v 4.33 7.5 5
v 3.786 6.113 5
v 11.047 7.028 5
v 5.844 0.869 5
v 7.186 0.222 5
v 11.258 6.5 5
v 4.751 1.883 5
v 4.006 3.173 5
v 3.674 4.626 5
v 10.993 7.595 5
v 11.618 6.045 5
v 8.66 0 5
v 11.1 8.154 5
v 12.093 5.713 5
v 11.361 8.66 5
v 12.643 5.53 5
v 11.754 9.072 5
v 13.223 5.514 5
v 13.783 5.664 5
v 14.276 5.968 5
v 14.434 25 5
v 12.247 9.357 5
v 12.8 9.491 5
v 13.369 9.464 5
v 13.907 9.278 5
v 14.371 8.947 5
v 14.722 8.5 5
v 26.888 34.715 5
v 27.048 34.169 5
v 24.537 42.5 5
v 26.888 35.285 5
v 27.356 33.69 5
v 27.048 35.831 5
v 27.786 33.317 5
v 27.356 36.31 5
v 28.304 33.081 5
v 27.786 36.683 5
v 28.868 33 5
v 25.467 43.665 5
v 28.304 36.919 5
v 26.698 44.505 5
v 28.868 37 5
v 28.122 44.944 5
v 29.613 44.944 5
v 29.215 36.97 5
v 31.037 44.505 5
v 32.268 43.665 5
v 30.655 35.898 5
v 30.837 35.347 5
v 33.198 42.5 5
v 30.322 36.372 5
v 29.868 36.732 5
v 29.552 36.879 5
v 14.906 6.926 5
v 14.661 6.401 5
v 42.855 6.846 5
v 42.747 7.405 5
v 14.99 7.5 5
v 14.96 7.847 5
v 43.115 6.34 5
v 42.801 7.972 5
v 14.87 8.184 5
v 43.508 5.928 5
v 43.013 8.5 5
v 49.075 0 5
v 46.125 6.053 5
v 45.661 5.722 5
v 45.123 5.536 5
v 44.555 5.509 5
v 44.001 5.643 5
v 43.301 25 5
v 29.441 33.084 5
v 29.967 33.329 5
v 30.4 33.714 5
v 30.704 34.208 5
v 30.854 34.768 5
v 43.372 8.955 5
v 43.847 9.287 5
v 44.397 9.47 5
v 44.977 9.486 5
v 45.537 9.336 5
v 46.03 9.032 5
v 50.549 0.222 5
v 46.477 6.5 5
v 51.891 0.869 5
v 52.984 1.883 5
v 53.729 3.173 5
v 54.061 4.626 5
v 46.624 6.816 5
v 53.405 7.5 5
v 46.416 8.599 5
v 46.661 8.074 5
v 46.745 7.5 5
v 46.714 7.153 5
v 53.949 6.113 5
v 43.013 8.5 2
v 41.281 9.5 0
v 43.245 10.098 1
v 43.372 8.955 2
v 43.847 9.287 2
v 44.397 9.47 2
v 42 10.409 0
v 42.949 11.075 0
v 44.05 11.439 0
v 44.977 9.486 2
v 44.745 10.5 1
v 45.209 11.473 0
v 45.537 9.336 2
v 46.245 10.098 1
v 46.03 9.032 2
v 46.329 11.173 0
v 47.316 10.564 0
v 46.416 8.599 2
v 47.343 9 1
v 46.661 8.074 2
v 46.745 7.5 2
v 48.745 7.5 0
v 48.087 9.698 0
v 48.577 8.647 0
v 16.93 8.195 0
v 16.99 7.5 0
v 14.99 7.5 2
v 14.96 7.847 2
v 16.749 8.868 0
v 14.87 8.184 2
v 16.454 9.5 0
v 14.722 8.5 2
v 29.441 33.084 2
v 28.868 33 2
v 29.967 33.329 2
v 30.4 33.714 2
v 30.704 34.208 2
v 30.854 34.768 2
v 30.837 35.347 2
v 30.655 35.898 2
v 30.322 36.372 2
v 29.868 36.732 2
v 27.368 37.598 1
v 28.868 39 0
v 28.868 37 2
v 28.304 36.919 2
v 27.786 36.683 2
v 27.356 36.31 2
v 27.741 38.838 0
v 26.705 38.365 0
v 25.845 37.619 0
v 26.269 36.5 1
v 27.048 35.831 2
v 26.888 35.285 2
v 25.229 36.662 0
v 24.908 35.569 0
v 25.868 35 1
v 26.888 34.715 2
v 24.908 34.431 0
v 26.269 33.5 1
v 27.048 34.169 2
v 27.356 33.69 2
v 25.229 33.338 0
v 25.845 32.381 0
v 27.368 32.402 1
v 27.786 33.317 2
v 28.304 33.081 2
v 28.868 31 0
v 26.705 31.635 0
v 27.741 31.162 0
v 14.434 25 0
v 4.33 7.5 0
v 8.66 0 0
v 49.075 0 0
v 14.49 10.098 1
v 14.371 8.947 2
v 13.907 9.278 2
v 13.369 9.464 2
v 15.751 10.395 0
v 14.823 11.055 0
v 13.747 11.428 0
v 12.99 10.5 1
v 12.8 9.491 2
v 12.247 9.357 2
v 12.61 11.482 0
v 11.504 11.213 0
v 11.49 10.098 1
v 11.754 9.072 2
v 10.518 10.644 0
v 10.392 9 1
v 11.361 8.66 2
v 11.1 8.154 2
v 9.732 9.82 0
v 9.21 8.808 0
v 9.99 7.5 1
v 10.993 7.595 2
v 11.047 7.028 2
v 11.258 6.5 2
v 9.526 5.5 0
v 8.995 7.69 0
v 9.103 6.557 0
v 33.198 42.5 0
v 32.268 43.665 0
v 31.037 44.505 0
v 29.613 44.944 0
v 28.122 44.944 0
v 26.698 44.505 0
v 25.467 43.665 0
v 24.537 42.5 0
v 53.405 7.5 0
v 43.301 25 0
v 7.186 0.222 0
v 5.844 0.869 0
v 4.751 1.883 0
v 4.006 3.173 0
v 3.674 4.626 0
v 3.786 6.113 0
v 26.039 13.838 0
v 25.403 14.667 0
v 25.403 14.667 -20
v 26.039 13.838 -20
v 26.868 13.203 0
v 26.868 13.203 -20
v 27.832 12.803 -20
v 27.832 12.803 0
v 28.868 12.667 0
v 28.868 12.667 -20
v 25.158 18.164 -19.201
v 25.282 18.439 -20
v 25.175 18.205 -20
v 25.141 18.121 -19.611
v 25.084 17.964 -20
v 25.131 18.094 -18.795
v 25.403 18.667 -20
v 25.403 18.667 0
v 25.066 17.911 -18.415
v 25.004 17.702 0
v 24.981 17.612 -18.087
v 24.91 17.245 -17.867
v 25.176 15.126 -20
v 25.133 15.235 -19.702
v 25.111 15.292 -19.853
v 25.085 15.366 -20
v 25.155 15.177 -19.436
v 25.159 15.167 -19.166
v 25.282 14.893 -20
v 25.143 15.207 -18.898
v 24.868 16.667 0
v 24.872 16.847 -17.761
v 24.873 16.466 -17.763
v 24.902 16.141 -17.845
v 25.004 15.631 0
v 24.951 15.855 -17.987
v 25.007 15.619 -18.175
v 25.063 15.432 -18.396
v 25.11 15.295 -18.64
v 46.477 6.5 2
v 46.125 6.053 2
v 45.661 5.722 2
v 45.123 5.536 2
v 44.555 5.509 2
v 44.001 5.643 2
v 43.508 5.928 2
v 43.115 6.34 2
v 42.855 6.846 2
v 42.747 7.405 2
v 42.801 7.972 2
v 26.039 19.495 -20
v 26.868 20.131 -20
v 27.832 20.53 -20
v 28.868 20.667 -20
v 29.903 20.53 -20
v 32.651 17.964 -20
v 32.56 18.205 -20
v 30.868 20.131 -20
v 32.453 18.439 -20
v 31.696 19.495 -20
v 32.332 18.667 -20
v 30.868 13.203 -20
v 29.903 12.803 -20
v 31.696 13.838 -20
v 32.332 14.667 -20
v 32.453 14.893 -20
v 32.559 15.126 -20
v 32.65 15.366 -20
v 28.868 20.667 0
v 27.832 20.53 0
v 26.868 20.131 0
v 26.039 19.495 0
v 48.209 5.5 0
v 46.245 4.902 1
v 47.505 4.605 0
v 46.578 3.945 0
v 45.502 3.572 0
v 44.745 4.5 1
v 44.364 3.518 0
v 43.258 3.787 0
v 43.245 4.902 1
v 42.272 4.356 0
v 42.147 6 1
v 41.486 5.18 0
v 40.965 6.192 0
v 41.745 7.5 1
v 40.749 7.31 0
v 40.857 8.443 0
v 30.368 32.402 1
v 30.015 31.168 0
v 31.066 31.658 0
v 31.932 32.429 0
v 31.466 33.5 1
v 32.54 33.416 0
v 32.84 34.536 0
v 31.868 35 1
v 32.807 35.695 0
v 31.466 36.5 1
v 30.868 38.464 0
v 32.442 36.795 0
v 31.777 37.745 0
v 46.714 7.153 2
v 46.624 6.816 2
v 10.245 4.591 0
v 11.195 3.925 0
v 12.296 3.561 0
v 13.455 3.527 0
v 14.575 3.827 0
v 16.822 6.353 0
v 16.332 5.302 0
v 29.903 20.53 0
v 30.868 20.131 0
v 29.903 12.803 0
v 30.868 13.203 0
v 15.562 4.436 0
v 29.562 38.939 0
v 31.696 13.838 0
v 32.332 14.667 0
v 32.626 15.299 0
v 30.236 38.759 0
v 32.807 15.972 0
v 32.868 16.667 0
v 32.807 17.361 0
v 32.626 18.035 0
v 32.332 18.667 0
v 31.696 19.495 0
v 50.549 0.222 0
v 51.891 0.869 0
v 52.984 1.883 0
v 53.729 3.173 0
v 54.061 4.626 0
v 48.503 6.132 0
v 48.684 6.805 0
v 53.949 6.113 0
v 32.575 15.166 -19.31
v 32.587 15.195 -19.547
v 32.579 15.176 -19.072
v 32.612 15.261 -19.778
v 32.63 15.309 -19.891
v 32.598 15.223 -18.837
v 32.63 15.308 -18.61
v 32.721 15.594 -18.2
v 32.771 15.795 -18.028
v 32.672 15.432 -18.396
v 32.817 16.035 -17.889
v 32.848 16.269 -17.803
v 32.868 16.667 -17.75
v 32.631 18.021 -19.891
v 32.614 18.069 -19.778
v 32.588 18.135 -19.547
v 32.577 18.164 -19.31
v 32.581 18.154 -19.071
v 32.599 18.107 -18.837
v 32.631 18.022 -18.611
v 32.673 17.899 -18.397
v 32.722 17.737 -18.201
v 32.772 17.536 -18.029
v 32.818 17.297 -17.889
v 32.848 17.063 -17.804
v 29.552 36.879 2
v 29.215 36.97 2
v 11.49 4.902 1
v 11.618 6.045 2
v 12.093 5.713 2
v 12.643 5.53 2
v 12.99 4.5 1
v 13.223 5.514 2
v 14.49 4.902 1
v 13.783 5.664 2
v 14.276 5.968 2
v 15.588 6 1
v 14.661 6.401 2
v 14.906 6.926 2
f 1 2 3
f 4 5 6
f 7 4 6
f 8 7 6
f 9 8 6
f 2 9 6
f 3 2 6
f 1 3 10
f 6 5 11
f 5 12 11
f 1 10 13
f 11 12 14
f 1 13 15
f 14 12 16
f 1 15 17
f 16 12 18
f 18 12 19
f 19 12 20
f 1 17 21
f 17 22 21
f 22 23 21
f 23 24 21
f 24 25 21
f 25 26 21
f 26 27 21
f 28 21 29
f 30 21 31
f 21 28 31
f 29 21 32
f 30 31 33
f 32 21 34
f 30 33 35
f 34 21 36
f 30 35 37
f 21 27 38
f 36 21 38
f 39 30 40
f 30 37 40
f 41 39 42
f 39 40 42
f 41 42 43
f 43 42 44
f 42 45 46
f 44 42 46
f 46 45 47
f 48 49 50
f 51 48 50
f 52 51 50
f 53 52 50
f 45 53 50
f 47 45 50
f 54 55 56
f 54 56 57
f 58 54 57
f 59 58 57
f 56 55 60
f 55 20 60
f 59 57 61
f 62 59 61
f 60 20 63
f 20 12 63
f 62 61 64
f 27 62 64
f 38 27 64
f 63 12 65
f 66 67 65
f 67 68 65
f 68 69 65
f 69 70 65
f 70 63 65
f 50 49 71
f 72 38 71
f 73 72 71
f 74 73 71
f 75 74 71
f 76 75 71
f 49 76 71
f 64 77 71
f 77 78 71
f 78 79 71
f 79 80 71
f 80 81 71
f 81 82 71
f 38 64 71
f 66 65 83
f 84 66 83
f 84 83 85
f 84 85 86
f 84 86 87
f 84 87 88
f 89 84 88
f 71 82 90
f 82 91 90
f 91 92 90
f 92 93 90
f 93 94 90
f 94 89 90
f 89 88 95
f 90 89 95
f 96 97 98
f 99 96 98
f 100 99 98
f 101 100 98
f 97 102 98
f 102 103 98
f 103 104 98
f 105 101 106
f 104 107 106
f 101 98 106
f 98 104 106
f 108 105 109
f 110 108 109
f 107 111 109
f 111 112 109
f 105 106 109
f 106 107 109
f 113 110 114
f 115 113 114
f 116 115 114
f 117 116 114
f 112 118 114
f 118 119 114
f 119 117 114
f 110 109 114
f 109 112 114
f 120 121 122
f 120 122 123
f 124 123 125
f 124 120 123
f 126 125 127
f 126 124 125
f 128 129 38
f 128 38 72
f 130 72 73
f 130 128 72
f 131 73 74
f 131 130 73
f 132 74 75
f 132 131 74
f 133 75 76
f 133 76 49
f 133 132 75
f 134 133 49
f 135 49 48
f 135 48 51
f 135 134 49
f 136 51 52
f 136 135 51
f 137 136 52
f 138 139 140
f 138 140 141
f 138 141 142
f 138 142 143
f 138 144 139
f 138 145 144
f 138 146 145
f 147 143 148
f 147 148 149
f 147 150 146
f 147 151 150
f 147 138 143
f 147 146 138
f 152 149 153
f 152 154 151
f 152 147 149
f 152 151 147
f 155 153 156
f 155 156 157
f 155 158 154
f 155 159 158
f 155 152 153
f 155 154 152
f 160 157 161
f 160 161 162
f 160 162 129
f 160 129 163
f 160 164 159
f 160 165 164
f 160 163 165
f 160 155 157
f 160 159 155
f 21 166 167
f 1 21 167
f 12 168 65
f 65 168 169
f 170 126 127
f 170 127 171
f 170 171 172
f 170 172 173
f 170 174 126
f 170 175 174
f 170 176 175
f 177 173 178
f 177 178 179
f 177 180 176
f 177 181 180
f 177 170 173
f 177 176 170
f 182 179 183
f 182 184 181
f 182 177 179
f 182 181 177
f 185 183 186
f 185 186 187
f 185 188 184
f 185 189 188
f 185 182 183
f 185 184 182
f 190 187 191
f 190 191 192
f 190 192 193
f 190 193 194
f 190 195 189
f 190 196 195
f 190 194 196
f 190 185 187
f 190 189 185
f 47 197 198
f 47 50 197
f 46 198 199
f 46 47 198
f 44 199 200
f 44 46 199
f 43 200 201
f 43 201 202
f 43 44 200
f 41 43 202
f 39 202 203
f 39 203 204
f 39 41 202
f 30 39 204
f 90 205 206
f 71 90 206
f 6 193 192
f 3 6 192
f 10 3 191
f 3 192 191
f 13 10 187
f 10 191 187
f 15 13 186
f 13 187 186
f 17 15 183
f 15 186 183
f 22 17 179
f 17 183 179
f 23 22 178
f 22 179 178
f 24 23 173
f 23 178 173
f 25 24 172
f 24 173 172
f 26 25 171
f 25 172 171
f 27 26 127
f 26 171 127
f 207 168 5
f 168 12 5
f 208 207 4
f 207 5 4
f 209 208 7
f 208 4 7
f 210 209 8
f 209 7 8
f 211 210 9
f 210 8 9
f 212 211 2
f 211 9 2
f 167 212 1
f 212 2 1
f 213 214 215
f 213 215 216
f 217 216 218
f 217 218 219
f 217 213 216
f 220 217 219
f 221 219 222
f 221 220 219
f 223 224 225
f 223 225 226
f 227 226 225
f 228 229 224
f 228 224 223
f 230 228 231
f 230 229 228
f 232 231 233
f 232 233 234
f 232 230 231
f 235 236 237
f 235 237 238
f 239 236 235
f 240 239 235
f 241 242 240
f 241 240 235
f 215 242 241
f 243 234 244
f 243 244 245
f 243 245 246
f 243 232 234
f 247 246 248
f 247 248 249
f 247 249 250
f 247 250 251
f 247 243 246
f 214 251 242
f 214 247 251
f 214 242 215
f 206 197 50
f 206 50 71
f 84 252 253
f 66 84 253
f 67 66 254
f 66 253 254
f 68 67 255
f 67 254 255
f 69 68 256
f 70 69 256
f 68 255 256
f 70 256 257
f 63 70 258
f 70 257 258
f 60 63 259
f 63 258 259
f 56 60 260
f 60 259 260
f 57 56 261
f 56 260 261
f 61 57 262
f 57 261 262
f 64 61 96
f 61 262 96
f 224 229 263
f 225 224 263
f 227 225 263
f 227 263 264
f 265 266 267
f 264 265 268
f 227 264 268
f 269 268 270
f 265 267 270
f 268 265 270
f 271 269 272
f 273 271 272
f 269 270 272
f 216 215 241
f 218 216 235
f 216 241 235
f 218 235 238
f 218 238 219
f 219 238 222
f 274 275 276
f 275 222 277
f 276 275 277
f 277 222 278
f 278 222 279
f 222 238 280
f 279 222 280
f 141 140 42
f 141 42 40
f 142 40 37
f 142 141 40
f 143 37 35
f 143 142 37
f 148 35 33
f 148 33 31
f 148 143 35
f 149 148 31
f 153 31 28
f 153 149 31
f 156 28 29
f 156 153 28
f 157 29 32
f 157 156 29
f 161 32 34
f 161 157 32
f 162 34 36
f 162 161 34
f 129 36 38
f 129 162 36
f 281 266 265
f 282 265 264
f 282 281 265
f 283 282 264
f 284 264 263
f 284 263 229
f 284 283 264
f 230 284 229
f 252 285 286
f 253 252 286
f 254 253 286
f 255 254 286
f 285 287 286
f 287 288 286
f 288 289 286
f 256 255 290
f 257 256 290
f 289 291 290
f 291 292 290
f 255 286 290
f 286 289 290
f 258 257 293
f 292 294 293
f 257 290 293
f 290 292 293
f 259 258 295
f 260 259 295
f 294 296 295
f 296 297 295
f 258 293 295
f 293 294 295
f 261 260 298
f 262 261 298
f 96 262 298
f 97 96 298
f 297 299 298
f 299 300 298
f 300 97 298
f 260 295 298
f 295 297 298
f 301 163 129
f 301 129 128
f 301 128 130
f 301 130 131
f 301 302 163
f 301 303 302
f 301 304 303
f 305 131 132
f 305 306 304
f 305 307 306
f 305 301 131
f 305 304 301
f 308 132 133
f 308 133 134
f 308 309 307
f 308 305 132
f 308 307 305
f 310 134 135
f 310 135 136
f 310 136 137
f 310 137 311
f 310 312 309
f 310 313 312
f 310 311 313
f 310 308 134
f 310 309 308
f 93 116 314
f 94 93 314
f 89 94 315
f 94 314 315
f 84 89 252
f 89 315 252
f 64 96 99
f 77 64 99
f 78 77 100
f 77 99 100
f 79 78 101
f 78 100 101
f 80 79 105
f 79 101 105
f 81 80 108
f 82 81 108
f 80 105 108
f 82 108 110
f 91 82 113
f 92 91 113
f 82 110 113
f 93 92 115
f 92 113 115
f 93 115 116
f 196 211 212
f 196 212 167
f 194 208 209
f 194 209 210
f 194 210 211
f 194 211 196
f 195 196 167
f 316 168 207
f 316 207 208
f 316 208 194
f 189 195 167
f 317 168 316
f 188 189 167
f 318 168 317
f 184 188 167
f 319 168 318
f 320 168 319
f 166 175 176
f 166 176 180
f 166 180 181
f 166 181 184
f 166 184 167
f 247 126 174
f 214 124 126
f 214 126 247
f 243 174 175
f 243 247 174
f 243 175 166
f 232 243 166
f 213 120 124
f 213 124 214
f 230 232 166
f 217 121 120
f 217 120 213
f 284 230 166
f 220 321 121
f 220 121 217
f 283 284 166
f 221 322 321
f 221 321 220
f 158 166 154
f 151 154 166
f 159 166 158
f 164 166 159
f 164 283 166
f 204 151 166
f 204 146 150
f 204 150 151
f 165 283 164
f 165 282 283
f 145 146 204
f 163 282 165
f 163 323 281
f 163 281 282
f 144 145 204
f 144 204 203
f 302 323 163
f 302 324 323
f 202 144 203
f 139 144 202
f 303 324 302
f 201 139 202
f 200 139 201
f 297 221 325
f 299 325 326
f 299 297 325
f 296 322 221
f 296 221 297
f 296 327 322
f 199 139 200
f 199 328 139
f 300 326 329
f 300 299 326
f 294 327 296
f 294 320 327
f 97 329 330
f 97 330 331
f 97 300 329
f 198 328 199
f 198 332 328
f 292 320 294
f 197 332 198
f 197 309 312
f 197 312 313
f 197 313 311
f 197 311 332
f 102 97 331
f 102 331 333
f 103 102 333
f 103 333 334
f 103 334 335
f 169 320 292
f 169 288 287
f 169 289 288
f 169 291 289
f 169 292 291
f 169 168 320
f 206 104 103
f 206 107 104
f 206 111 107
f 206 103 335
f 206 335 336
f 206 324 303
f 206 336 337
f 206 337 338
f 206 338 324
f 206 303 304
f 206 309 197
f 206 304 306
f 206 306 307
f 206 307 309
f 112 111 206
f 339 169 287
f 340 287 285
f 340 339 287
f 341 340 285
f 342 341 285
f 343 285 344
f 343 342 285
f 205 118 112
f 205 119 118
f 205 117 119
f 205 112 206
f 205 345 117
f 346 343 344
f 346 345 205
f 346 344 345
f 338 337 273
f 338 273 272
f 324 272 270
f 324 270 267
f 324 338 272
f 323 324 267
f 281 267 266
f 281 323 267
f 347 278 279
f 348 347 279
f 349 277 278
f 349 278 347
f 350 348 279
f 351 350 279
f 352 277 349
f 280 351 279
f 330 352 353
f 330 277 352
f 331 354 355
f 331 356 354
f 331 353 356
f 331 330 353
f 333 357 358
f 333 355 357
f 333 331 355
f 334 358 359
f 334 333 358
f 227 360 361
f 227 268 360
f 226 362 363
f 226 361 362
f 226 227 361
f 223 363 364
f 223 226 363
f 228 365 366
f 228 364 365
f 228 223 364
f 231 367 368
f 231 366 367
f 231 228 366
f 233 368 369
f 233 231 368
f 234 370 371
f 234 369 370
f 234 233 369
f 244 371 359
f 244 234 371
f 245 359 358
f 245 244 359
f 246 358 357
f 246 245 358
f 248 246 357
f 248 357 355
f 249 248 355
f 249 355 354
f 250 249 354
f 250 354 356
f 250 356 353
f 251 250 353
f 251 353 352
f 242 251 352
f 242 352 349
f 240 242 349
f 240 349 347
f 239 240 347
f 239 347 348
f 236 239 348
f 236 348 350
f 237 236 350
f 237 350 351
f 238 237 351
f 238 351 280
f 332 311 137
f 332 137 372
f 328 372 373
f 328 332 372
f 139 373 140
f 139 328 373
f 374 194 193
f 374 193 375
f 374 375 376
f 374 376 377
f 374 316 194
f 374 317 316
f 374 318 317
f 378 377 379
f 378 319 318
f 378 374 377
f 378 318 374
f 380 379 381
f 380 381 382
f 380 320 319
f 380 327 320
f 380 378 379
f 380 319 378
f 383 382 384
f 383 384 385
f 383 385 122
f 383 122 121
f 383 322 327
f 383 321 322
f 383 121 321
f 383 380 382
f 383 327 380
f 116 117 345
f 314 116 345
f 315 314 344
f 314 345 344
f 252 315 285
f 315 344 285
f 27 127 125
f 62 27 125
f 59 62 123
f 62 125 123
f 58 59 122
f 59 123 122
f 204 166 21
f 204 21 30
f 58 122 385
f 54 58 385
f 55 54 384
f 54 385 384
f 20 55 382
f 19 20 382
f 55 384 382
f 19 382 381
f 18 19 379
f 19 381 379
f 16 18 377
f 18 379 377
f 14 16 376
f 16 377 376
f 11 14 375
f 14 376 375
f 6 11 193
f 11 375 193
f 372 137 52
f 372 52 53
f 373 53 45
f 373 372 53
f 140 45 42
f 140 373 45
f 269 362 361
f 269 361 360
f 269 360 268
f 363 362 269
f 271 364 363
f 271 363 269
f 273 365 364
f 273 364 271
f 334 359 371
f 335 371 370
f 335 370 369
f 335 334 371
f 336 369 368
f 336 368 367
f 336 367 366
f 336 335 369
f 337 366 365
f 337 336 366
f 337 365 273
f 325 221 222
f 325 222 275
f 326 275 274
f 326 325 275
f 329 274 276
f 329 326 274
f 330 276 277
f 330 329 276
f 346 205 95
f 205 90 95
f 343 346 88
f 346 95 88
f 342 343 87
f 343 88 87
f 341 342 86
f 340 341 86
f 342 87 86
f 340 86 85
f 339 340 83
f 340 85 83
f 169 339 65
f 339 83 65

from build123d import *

# Parameters (mm, degrees)
F1_DEPTH = 5
F2_DEPTH = 20
F4_DEPTH = 37.6
F5_SIZE  = 2
F6_R     = 5


# Not quite as in the source:
# - a pattern or mirror of a feature is missing from the dataset's text; its kind, count and spacing are read off the source's solid


with BuildPart() as f1:
    # F0 (on Top) → F1 (new body)
    with BuildSketch(Plane.XY):
        with BuildLine():
            Line((11.2583302492, 6.5), (0, 0))
            Line((0, 0), (28.8675134595, 0))
            Line((28.8675134595, 0), (28.8675134595, 12.6666666667))
            ThreePointArc((28.8675134595, 12.6666666667), (26.8675134595, 13.2025650515), (25.4034118443, 14.6666666667))
            Line((25.4034118443, 14.6666666667), (14.7224318643, 8.5))
            ThreePointArc((14.7224318643, 8.5), (14.9222327093, 8.0176380902), (14.9903810568, 7.5))
            ThreePointArc((14.9903810568, 7.5), (13.508019147, 5.5681483474), (11.2583302492, 6.5))
        make_face()
        with BuildLine():
            Line((14.4337567297, 25), (0, 0))
            Line((0, 0), (11.2583302492, 6.5))
            ThreePointArc((11.2583302492, 6.5), (11.9903810568, 9.2320508076), (14.7224318643, 8.5))
            Line((14.7224318643, 8.5), (25.4034118443, 14.6666666667))
            ThreePointArc((25.4034118443, 14.6666666667), (24.8675134595, 16.6666666667), (25.4034118443, 18.6666666667))
            Line((25.4034118443, 18.6666666667), (14.4337567297, 25))
        make_face()
        with BuildLine():
            Line((28.8675134595, 12.6666666667), (28.8675134595, 0))
            Line((28.8675134595, 0), (57.735026919, 0))
            Line((57.735026919, 0), (46.4766966698, 6.5))
            ThreePointArc((46.4766966698, 6.5), (43.7446458622, 5.7679491924), (43.0125950546, 8.5))
            Line((43.0125950546, 8.5), (32.3316150746, 14.6666666667))
            ThreePointArc((32.3316150746, 14.6666666667), (30.8675134595, 13.2025650515), (28.8675134595, 12.6666666667))
        make_face()
        with BuildLine():
            ThreePointArc((28.8675134595, 20.6666666667), (26.8675134595, 20.1307682818), (25.4034118443, 18.6666666667))
            Line((25.4034118443, 18.6666666667), (28.8675134595, 16.6666666667))
            Line((28.8675134595, 16.6666666667), (28.8675134595, 20.6666666667))
        make_face()
        with BuildLine():
            Line((28.8675134595, 16.6666666667), (25.4034118443, 18.6666666667))
            ThreePointArc((25.4034118443, 18.6666666667), (24.8675134595, 16.6666666667), (25.4034118443, 14.6666666667))
            Line((25.4034118443, 14.6666666667), (28.8675134595, 16.6666666667))
        make_face()
        with BuildLine():
            Line((46.4766966698, 6.5), (57.735026919, 0))
            Line((57.735026919, 0), (43.3012701892, 25))
            Line((43.3012701892, 25), (32.3316150746, 18.6666666667))
            ThreePointArc((32.3316150746, 18.6666666667), (32.7312167646, 17.7019428471), (32.8675134595, 16.6666666667))
            ThreePointArc((32.8675134595, 16.6666666667), (32.7312167646, 15.6313904863), (32.3316150746, 14.6666666667))
            Line((32.3316150746, 14.6666666667), (43.0125950546, 8.5))
            ThreePointArc((43.0125950546, 8.5), (45.2622839524, 9.4318516526), (46.7446458622, 7.5))
            ThreePointArc((46.7446458622, 7.5), (46.6764975148, 6.9823619098), (46.4766966698, 6.5))
        make_face()
        with BuildLine():
            ThreePointArc((25.4034118443, 14.6666666667), (26.8675134595, 13.2025650515), (28.8675134595, 12.6666666667))
            Line((28.8675134595, 12.6666666667), (28.8675134595, 16.6666666667))
            Line((28.8675134595, 16.6666666667), (25.4034118443, 14.6666666667))
        make_face()
        with BuildLine():
            Line((28.8675134595, 16.6666666667), (28.8675134595, 12.6666666667))
            ThreePointArc((28.8675134595, 12.6666666667), (30.8675134595, 13.2025650515), (32.3316150746, 14.6666666667))
            Line((32.3316150746, 14.6666666667), (28.8675134595, 16.6666666667))
        make_face()
        with BuildLine():
            Line((28.8675134595, 20.6666666667), (28.8675134595, 16.6666666667))
            Line((28.8675134595, 16.6666666667), (32.3316150746, 18.6666666667))
            ThreePointArc((32.3316150746, 18.6666666667), (30.8675134595, 20.1307682818), (28.8675134595, 20.6666666667))
        make_face()
        with BuildLine():
            Line((32.3316150746, 18.6666666667), (28.8675134595, 16.6666666667))
            Line((28.8675134595, 16.6666666667), (32.3316150746, 14.6666666667))
            ThreePointArc((32.3316150746, 14.6666666667), (32.7312167646, 15.6313904863), (32.8675134595, 16.6666666667))
            ThreePointArc((32.8675134595, 16.6666666667), (32.7312167646, 17.7019428471), (32.3316150746, 18.6666666667))
        make_face()
    extrude(amount=F1_DEPTH)

    # F1_copies: F1 across plane


with BuildPart() as f1_1:
    add(f1.part)
    add(f1.part.mirror(Plane(origin=(0, 0, 0), x_dir=(0.8660254038, 0.5, 0), z_dir=(-0.5, 0.8660254038, 0))))

    # F0 (on Top) → F2 (join)
    with BuildSketch(Plane.XY):
        with BuildLine():
            Line((32.3316150746, 18.6666666667), (28.8675134595, 16.6666666667))
            Line((28.8675134595, 16.6666666667), (32.3316150746, 14.6666666667))
            ThreePointArc((32.3316150746, 14.6666666667), (32.7312167646, 15.6313904863), (32.8675134595, 16.6666666667))
            ThreePointArc((32.8675134595, 16.6666666667), (32.7312167646, 17.7019428471), (32.3316150746, 18.6666666667))
        make_face()
        with BuildLine():
            Line((28.8675134595, 20.6666666667), (28.8675134595, 16.6666666667))
            Line((28.8675134595, 16.6666666667), (32.3316150746, 18.6666666667))
            ThreePointArc((32.3316150746, 18.6666666667), (30.8675134595, 20.1307682818), (28.8675134595, 20.6666666667))
        make_face()
        with BuildLine():
            ThreePointArc((28.8675134595, 20.6666666667), (26.8675134595, 20.1307682818), (25.4034118443, 18.6666666667))
            Line((25.4034118443, 18.6666666667), (28.8675134595, 16.6666666667))
            Line((28.8675134595, 16.6666666667), (28.8675134595, 20.6666666667))
        make_face()
        with BuildLine():
            Line((28.8675134595, 16.6666666667), (25.4034118443, 18.6666666667))
            ThreePointArc((25.4034118443, 18.6666666667), (24.8675134595, 16.6666666667), (25.4034118443, 14.6666666667))
            Line((25.4034118443, 14.6666666667), (28.8675134595, 16.6666666667))
        make_face()
        with BuildLine():
            ThreePointArc((25.4034118443, 14.6666666667), (26.8675134595, 13.2025650515), (28.8675134595, 12.6666666667))
            Line((28.8675134595, 12.6666666667), (28.8675134595, 16.6666666667))
            Line((28.8675134595, 16.6666666667), (25.4034118443, 14.6666666667))
        make_face()
        with BuildLine():
            Line((28.8675134595, 16.6666666667), (28.8675134595, 12.6666666667))
            ThreePointArc((28.8675134595, 12.6666666667), (30.8675134595, 13.2025650515), (32.3316150746, 14.6666666667))
            Line((32.3316150746, 14.6666666667), (28.8675134595, 16.6666666667))
        make_face()
    extrude(amount=-F2_DEPTH)

    # F3 (on Right) → F4 (cut)
    with BuildSketch(Plane.YZ):
        with BuildLine():
            ThreePointArc((15.165, -19.25), (16.665, -20.75), (18.165, -19.25))
            ThreePointArc((18.165, -19.25), (16.665, -17.75), (15.165, -19.25))
        make_face()
    extrude(amount=F4_DEPTH, mode=Mode.SUBTRACT)

    # F5
    f5_edges = [f1_1.edges().sort_by_distance(p)[0] for p in [
        (10.990381, 7.5, 0),
        (28.867513, 37, 0),
        (46.476697, 6.5, 0),
    ]]
    chamfer(f5_edges, length=F5_SIZE)

    # F6
    f6_edges = [f1_1.edges().sort_by_distance(p)[0] for p in [
        (57.735027, 0, 2.5),
        (0, 0, 2.5),
        (28.867513, 50, 2.5),
    ]]
    fillet(f6_edges, radius=F6_R)


solid = f1_1.part
